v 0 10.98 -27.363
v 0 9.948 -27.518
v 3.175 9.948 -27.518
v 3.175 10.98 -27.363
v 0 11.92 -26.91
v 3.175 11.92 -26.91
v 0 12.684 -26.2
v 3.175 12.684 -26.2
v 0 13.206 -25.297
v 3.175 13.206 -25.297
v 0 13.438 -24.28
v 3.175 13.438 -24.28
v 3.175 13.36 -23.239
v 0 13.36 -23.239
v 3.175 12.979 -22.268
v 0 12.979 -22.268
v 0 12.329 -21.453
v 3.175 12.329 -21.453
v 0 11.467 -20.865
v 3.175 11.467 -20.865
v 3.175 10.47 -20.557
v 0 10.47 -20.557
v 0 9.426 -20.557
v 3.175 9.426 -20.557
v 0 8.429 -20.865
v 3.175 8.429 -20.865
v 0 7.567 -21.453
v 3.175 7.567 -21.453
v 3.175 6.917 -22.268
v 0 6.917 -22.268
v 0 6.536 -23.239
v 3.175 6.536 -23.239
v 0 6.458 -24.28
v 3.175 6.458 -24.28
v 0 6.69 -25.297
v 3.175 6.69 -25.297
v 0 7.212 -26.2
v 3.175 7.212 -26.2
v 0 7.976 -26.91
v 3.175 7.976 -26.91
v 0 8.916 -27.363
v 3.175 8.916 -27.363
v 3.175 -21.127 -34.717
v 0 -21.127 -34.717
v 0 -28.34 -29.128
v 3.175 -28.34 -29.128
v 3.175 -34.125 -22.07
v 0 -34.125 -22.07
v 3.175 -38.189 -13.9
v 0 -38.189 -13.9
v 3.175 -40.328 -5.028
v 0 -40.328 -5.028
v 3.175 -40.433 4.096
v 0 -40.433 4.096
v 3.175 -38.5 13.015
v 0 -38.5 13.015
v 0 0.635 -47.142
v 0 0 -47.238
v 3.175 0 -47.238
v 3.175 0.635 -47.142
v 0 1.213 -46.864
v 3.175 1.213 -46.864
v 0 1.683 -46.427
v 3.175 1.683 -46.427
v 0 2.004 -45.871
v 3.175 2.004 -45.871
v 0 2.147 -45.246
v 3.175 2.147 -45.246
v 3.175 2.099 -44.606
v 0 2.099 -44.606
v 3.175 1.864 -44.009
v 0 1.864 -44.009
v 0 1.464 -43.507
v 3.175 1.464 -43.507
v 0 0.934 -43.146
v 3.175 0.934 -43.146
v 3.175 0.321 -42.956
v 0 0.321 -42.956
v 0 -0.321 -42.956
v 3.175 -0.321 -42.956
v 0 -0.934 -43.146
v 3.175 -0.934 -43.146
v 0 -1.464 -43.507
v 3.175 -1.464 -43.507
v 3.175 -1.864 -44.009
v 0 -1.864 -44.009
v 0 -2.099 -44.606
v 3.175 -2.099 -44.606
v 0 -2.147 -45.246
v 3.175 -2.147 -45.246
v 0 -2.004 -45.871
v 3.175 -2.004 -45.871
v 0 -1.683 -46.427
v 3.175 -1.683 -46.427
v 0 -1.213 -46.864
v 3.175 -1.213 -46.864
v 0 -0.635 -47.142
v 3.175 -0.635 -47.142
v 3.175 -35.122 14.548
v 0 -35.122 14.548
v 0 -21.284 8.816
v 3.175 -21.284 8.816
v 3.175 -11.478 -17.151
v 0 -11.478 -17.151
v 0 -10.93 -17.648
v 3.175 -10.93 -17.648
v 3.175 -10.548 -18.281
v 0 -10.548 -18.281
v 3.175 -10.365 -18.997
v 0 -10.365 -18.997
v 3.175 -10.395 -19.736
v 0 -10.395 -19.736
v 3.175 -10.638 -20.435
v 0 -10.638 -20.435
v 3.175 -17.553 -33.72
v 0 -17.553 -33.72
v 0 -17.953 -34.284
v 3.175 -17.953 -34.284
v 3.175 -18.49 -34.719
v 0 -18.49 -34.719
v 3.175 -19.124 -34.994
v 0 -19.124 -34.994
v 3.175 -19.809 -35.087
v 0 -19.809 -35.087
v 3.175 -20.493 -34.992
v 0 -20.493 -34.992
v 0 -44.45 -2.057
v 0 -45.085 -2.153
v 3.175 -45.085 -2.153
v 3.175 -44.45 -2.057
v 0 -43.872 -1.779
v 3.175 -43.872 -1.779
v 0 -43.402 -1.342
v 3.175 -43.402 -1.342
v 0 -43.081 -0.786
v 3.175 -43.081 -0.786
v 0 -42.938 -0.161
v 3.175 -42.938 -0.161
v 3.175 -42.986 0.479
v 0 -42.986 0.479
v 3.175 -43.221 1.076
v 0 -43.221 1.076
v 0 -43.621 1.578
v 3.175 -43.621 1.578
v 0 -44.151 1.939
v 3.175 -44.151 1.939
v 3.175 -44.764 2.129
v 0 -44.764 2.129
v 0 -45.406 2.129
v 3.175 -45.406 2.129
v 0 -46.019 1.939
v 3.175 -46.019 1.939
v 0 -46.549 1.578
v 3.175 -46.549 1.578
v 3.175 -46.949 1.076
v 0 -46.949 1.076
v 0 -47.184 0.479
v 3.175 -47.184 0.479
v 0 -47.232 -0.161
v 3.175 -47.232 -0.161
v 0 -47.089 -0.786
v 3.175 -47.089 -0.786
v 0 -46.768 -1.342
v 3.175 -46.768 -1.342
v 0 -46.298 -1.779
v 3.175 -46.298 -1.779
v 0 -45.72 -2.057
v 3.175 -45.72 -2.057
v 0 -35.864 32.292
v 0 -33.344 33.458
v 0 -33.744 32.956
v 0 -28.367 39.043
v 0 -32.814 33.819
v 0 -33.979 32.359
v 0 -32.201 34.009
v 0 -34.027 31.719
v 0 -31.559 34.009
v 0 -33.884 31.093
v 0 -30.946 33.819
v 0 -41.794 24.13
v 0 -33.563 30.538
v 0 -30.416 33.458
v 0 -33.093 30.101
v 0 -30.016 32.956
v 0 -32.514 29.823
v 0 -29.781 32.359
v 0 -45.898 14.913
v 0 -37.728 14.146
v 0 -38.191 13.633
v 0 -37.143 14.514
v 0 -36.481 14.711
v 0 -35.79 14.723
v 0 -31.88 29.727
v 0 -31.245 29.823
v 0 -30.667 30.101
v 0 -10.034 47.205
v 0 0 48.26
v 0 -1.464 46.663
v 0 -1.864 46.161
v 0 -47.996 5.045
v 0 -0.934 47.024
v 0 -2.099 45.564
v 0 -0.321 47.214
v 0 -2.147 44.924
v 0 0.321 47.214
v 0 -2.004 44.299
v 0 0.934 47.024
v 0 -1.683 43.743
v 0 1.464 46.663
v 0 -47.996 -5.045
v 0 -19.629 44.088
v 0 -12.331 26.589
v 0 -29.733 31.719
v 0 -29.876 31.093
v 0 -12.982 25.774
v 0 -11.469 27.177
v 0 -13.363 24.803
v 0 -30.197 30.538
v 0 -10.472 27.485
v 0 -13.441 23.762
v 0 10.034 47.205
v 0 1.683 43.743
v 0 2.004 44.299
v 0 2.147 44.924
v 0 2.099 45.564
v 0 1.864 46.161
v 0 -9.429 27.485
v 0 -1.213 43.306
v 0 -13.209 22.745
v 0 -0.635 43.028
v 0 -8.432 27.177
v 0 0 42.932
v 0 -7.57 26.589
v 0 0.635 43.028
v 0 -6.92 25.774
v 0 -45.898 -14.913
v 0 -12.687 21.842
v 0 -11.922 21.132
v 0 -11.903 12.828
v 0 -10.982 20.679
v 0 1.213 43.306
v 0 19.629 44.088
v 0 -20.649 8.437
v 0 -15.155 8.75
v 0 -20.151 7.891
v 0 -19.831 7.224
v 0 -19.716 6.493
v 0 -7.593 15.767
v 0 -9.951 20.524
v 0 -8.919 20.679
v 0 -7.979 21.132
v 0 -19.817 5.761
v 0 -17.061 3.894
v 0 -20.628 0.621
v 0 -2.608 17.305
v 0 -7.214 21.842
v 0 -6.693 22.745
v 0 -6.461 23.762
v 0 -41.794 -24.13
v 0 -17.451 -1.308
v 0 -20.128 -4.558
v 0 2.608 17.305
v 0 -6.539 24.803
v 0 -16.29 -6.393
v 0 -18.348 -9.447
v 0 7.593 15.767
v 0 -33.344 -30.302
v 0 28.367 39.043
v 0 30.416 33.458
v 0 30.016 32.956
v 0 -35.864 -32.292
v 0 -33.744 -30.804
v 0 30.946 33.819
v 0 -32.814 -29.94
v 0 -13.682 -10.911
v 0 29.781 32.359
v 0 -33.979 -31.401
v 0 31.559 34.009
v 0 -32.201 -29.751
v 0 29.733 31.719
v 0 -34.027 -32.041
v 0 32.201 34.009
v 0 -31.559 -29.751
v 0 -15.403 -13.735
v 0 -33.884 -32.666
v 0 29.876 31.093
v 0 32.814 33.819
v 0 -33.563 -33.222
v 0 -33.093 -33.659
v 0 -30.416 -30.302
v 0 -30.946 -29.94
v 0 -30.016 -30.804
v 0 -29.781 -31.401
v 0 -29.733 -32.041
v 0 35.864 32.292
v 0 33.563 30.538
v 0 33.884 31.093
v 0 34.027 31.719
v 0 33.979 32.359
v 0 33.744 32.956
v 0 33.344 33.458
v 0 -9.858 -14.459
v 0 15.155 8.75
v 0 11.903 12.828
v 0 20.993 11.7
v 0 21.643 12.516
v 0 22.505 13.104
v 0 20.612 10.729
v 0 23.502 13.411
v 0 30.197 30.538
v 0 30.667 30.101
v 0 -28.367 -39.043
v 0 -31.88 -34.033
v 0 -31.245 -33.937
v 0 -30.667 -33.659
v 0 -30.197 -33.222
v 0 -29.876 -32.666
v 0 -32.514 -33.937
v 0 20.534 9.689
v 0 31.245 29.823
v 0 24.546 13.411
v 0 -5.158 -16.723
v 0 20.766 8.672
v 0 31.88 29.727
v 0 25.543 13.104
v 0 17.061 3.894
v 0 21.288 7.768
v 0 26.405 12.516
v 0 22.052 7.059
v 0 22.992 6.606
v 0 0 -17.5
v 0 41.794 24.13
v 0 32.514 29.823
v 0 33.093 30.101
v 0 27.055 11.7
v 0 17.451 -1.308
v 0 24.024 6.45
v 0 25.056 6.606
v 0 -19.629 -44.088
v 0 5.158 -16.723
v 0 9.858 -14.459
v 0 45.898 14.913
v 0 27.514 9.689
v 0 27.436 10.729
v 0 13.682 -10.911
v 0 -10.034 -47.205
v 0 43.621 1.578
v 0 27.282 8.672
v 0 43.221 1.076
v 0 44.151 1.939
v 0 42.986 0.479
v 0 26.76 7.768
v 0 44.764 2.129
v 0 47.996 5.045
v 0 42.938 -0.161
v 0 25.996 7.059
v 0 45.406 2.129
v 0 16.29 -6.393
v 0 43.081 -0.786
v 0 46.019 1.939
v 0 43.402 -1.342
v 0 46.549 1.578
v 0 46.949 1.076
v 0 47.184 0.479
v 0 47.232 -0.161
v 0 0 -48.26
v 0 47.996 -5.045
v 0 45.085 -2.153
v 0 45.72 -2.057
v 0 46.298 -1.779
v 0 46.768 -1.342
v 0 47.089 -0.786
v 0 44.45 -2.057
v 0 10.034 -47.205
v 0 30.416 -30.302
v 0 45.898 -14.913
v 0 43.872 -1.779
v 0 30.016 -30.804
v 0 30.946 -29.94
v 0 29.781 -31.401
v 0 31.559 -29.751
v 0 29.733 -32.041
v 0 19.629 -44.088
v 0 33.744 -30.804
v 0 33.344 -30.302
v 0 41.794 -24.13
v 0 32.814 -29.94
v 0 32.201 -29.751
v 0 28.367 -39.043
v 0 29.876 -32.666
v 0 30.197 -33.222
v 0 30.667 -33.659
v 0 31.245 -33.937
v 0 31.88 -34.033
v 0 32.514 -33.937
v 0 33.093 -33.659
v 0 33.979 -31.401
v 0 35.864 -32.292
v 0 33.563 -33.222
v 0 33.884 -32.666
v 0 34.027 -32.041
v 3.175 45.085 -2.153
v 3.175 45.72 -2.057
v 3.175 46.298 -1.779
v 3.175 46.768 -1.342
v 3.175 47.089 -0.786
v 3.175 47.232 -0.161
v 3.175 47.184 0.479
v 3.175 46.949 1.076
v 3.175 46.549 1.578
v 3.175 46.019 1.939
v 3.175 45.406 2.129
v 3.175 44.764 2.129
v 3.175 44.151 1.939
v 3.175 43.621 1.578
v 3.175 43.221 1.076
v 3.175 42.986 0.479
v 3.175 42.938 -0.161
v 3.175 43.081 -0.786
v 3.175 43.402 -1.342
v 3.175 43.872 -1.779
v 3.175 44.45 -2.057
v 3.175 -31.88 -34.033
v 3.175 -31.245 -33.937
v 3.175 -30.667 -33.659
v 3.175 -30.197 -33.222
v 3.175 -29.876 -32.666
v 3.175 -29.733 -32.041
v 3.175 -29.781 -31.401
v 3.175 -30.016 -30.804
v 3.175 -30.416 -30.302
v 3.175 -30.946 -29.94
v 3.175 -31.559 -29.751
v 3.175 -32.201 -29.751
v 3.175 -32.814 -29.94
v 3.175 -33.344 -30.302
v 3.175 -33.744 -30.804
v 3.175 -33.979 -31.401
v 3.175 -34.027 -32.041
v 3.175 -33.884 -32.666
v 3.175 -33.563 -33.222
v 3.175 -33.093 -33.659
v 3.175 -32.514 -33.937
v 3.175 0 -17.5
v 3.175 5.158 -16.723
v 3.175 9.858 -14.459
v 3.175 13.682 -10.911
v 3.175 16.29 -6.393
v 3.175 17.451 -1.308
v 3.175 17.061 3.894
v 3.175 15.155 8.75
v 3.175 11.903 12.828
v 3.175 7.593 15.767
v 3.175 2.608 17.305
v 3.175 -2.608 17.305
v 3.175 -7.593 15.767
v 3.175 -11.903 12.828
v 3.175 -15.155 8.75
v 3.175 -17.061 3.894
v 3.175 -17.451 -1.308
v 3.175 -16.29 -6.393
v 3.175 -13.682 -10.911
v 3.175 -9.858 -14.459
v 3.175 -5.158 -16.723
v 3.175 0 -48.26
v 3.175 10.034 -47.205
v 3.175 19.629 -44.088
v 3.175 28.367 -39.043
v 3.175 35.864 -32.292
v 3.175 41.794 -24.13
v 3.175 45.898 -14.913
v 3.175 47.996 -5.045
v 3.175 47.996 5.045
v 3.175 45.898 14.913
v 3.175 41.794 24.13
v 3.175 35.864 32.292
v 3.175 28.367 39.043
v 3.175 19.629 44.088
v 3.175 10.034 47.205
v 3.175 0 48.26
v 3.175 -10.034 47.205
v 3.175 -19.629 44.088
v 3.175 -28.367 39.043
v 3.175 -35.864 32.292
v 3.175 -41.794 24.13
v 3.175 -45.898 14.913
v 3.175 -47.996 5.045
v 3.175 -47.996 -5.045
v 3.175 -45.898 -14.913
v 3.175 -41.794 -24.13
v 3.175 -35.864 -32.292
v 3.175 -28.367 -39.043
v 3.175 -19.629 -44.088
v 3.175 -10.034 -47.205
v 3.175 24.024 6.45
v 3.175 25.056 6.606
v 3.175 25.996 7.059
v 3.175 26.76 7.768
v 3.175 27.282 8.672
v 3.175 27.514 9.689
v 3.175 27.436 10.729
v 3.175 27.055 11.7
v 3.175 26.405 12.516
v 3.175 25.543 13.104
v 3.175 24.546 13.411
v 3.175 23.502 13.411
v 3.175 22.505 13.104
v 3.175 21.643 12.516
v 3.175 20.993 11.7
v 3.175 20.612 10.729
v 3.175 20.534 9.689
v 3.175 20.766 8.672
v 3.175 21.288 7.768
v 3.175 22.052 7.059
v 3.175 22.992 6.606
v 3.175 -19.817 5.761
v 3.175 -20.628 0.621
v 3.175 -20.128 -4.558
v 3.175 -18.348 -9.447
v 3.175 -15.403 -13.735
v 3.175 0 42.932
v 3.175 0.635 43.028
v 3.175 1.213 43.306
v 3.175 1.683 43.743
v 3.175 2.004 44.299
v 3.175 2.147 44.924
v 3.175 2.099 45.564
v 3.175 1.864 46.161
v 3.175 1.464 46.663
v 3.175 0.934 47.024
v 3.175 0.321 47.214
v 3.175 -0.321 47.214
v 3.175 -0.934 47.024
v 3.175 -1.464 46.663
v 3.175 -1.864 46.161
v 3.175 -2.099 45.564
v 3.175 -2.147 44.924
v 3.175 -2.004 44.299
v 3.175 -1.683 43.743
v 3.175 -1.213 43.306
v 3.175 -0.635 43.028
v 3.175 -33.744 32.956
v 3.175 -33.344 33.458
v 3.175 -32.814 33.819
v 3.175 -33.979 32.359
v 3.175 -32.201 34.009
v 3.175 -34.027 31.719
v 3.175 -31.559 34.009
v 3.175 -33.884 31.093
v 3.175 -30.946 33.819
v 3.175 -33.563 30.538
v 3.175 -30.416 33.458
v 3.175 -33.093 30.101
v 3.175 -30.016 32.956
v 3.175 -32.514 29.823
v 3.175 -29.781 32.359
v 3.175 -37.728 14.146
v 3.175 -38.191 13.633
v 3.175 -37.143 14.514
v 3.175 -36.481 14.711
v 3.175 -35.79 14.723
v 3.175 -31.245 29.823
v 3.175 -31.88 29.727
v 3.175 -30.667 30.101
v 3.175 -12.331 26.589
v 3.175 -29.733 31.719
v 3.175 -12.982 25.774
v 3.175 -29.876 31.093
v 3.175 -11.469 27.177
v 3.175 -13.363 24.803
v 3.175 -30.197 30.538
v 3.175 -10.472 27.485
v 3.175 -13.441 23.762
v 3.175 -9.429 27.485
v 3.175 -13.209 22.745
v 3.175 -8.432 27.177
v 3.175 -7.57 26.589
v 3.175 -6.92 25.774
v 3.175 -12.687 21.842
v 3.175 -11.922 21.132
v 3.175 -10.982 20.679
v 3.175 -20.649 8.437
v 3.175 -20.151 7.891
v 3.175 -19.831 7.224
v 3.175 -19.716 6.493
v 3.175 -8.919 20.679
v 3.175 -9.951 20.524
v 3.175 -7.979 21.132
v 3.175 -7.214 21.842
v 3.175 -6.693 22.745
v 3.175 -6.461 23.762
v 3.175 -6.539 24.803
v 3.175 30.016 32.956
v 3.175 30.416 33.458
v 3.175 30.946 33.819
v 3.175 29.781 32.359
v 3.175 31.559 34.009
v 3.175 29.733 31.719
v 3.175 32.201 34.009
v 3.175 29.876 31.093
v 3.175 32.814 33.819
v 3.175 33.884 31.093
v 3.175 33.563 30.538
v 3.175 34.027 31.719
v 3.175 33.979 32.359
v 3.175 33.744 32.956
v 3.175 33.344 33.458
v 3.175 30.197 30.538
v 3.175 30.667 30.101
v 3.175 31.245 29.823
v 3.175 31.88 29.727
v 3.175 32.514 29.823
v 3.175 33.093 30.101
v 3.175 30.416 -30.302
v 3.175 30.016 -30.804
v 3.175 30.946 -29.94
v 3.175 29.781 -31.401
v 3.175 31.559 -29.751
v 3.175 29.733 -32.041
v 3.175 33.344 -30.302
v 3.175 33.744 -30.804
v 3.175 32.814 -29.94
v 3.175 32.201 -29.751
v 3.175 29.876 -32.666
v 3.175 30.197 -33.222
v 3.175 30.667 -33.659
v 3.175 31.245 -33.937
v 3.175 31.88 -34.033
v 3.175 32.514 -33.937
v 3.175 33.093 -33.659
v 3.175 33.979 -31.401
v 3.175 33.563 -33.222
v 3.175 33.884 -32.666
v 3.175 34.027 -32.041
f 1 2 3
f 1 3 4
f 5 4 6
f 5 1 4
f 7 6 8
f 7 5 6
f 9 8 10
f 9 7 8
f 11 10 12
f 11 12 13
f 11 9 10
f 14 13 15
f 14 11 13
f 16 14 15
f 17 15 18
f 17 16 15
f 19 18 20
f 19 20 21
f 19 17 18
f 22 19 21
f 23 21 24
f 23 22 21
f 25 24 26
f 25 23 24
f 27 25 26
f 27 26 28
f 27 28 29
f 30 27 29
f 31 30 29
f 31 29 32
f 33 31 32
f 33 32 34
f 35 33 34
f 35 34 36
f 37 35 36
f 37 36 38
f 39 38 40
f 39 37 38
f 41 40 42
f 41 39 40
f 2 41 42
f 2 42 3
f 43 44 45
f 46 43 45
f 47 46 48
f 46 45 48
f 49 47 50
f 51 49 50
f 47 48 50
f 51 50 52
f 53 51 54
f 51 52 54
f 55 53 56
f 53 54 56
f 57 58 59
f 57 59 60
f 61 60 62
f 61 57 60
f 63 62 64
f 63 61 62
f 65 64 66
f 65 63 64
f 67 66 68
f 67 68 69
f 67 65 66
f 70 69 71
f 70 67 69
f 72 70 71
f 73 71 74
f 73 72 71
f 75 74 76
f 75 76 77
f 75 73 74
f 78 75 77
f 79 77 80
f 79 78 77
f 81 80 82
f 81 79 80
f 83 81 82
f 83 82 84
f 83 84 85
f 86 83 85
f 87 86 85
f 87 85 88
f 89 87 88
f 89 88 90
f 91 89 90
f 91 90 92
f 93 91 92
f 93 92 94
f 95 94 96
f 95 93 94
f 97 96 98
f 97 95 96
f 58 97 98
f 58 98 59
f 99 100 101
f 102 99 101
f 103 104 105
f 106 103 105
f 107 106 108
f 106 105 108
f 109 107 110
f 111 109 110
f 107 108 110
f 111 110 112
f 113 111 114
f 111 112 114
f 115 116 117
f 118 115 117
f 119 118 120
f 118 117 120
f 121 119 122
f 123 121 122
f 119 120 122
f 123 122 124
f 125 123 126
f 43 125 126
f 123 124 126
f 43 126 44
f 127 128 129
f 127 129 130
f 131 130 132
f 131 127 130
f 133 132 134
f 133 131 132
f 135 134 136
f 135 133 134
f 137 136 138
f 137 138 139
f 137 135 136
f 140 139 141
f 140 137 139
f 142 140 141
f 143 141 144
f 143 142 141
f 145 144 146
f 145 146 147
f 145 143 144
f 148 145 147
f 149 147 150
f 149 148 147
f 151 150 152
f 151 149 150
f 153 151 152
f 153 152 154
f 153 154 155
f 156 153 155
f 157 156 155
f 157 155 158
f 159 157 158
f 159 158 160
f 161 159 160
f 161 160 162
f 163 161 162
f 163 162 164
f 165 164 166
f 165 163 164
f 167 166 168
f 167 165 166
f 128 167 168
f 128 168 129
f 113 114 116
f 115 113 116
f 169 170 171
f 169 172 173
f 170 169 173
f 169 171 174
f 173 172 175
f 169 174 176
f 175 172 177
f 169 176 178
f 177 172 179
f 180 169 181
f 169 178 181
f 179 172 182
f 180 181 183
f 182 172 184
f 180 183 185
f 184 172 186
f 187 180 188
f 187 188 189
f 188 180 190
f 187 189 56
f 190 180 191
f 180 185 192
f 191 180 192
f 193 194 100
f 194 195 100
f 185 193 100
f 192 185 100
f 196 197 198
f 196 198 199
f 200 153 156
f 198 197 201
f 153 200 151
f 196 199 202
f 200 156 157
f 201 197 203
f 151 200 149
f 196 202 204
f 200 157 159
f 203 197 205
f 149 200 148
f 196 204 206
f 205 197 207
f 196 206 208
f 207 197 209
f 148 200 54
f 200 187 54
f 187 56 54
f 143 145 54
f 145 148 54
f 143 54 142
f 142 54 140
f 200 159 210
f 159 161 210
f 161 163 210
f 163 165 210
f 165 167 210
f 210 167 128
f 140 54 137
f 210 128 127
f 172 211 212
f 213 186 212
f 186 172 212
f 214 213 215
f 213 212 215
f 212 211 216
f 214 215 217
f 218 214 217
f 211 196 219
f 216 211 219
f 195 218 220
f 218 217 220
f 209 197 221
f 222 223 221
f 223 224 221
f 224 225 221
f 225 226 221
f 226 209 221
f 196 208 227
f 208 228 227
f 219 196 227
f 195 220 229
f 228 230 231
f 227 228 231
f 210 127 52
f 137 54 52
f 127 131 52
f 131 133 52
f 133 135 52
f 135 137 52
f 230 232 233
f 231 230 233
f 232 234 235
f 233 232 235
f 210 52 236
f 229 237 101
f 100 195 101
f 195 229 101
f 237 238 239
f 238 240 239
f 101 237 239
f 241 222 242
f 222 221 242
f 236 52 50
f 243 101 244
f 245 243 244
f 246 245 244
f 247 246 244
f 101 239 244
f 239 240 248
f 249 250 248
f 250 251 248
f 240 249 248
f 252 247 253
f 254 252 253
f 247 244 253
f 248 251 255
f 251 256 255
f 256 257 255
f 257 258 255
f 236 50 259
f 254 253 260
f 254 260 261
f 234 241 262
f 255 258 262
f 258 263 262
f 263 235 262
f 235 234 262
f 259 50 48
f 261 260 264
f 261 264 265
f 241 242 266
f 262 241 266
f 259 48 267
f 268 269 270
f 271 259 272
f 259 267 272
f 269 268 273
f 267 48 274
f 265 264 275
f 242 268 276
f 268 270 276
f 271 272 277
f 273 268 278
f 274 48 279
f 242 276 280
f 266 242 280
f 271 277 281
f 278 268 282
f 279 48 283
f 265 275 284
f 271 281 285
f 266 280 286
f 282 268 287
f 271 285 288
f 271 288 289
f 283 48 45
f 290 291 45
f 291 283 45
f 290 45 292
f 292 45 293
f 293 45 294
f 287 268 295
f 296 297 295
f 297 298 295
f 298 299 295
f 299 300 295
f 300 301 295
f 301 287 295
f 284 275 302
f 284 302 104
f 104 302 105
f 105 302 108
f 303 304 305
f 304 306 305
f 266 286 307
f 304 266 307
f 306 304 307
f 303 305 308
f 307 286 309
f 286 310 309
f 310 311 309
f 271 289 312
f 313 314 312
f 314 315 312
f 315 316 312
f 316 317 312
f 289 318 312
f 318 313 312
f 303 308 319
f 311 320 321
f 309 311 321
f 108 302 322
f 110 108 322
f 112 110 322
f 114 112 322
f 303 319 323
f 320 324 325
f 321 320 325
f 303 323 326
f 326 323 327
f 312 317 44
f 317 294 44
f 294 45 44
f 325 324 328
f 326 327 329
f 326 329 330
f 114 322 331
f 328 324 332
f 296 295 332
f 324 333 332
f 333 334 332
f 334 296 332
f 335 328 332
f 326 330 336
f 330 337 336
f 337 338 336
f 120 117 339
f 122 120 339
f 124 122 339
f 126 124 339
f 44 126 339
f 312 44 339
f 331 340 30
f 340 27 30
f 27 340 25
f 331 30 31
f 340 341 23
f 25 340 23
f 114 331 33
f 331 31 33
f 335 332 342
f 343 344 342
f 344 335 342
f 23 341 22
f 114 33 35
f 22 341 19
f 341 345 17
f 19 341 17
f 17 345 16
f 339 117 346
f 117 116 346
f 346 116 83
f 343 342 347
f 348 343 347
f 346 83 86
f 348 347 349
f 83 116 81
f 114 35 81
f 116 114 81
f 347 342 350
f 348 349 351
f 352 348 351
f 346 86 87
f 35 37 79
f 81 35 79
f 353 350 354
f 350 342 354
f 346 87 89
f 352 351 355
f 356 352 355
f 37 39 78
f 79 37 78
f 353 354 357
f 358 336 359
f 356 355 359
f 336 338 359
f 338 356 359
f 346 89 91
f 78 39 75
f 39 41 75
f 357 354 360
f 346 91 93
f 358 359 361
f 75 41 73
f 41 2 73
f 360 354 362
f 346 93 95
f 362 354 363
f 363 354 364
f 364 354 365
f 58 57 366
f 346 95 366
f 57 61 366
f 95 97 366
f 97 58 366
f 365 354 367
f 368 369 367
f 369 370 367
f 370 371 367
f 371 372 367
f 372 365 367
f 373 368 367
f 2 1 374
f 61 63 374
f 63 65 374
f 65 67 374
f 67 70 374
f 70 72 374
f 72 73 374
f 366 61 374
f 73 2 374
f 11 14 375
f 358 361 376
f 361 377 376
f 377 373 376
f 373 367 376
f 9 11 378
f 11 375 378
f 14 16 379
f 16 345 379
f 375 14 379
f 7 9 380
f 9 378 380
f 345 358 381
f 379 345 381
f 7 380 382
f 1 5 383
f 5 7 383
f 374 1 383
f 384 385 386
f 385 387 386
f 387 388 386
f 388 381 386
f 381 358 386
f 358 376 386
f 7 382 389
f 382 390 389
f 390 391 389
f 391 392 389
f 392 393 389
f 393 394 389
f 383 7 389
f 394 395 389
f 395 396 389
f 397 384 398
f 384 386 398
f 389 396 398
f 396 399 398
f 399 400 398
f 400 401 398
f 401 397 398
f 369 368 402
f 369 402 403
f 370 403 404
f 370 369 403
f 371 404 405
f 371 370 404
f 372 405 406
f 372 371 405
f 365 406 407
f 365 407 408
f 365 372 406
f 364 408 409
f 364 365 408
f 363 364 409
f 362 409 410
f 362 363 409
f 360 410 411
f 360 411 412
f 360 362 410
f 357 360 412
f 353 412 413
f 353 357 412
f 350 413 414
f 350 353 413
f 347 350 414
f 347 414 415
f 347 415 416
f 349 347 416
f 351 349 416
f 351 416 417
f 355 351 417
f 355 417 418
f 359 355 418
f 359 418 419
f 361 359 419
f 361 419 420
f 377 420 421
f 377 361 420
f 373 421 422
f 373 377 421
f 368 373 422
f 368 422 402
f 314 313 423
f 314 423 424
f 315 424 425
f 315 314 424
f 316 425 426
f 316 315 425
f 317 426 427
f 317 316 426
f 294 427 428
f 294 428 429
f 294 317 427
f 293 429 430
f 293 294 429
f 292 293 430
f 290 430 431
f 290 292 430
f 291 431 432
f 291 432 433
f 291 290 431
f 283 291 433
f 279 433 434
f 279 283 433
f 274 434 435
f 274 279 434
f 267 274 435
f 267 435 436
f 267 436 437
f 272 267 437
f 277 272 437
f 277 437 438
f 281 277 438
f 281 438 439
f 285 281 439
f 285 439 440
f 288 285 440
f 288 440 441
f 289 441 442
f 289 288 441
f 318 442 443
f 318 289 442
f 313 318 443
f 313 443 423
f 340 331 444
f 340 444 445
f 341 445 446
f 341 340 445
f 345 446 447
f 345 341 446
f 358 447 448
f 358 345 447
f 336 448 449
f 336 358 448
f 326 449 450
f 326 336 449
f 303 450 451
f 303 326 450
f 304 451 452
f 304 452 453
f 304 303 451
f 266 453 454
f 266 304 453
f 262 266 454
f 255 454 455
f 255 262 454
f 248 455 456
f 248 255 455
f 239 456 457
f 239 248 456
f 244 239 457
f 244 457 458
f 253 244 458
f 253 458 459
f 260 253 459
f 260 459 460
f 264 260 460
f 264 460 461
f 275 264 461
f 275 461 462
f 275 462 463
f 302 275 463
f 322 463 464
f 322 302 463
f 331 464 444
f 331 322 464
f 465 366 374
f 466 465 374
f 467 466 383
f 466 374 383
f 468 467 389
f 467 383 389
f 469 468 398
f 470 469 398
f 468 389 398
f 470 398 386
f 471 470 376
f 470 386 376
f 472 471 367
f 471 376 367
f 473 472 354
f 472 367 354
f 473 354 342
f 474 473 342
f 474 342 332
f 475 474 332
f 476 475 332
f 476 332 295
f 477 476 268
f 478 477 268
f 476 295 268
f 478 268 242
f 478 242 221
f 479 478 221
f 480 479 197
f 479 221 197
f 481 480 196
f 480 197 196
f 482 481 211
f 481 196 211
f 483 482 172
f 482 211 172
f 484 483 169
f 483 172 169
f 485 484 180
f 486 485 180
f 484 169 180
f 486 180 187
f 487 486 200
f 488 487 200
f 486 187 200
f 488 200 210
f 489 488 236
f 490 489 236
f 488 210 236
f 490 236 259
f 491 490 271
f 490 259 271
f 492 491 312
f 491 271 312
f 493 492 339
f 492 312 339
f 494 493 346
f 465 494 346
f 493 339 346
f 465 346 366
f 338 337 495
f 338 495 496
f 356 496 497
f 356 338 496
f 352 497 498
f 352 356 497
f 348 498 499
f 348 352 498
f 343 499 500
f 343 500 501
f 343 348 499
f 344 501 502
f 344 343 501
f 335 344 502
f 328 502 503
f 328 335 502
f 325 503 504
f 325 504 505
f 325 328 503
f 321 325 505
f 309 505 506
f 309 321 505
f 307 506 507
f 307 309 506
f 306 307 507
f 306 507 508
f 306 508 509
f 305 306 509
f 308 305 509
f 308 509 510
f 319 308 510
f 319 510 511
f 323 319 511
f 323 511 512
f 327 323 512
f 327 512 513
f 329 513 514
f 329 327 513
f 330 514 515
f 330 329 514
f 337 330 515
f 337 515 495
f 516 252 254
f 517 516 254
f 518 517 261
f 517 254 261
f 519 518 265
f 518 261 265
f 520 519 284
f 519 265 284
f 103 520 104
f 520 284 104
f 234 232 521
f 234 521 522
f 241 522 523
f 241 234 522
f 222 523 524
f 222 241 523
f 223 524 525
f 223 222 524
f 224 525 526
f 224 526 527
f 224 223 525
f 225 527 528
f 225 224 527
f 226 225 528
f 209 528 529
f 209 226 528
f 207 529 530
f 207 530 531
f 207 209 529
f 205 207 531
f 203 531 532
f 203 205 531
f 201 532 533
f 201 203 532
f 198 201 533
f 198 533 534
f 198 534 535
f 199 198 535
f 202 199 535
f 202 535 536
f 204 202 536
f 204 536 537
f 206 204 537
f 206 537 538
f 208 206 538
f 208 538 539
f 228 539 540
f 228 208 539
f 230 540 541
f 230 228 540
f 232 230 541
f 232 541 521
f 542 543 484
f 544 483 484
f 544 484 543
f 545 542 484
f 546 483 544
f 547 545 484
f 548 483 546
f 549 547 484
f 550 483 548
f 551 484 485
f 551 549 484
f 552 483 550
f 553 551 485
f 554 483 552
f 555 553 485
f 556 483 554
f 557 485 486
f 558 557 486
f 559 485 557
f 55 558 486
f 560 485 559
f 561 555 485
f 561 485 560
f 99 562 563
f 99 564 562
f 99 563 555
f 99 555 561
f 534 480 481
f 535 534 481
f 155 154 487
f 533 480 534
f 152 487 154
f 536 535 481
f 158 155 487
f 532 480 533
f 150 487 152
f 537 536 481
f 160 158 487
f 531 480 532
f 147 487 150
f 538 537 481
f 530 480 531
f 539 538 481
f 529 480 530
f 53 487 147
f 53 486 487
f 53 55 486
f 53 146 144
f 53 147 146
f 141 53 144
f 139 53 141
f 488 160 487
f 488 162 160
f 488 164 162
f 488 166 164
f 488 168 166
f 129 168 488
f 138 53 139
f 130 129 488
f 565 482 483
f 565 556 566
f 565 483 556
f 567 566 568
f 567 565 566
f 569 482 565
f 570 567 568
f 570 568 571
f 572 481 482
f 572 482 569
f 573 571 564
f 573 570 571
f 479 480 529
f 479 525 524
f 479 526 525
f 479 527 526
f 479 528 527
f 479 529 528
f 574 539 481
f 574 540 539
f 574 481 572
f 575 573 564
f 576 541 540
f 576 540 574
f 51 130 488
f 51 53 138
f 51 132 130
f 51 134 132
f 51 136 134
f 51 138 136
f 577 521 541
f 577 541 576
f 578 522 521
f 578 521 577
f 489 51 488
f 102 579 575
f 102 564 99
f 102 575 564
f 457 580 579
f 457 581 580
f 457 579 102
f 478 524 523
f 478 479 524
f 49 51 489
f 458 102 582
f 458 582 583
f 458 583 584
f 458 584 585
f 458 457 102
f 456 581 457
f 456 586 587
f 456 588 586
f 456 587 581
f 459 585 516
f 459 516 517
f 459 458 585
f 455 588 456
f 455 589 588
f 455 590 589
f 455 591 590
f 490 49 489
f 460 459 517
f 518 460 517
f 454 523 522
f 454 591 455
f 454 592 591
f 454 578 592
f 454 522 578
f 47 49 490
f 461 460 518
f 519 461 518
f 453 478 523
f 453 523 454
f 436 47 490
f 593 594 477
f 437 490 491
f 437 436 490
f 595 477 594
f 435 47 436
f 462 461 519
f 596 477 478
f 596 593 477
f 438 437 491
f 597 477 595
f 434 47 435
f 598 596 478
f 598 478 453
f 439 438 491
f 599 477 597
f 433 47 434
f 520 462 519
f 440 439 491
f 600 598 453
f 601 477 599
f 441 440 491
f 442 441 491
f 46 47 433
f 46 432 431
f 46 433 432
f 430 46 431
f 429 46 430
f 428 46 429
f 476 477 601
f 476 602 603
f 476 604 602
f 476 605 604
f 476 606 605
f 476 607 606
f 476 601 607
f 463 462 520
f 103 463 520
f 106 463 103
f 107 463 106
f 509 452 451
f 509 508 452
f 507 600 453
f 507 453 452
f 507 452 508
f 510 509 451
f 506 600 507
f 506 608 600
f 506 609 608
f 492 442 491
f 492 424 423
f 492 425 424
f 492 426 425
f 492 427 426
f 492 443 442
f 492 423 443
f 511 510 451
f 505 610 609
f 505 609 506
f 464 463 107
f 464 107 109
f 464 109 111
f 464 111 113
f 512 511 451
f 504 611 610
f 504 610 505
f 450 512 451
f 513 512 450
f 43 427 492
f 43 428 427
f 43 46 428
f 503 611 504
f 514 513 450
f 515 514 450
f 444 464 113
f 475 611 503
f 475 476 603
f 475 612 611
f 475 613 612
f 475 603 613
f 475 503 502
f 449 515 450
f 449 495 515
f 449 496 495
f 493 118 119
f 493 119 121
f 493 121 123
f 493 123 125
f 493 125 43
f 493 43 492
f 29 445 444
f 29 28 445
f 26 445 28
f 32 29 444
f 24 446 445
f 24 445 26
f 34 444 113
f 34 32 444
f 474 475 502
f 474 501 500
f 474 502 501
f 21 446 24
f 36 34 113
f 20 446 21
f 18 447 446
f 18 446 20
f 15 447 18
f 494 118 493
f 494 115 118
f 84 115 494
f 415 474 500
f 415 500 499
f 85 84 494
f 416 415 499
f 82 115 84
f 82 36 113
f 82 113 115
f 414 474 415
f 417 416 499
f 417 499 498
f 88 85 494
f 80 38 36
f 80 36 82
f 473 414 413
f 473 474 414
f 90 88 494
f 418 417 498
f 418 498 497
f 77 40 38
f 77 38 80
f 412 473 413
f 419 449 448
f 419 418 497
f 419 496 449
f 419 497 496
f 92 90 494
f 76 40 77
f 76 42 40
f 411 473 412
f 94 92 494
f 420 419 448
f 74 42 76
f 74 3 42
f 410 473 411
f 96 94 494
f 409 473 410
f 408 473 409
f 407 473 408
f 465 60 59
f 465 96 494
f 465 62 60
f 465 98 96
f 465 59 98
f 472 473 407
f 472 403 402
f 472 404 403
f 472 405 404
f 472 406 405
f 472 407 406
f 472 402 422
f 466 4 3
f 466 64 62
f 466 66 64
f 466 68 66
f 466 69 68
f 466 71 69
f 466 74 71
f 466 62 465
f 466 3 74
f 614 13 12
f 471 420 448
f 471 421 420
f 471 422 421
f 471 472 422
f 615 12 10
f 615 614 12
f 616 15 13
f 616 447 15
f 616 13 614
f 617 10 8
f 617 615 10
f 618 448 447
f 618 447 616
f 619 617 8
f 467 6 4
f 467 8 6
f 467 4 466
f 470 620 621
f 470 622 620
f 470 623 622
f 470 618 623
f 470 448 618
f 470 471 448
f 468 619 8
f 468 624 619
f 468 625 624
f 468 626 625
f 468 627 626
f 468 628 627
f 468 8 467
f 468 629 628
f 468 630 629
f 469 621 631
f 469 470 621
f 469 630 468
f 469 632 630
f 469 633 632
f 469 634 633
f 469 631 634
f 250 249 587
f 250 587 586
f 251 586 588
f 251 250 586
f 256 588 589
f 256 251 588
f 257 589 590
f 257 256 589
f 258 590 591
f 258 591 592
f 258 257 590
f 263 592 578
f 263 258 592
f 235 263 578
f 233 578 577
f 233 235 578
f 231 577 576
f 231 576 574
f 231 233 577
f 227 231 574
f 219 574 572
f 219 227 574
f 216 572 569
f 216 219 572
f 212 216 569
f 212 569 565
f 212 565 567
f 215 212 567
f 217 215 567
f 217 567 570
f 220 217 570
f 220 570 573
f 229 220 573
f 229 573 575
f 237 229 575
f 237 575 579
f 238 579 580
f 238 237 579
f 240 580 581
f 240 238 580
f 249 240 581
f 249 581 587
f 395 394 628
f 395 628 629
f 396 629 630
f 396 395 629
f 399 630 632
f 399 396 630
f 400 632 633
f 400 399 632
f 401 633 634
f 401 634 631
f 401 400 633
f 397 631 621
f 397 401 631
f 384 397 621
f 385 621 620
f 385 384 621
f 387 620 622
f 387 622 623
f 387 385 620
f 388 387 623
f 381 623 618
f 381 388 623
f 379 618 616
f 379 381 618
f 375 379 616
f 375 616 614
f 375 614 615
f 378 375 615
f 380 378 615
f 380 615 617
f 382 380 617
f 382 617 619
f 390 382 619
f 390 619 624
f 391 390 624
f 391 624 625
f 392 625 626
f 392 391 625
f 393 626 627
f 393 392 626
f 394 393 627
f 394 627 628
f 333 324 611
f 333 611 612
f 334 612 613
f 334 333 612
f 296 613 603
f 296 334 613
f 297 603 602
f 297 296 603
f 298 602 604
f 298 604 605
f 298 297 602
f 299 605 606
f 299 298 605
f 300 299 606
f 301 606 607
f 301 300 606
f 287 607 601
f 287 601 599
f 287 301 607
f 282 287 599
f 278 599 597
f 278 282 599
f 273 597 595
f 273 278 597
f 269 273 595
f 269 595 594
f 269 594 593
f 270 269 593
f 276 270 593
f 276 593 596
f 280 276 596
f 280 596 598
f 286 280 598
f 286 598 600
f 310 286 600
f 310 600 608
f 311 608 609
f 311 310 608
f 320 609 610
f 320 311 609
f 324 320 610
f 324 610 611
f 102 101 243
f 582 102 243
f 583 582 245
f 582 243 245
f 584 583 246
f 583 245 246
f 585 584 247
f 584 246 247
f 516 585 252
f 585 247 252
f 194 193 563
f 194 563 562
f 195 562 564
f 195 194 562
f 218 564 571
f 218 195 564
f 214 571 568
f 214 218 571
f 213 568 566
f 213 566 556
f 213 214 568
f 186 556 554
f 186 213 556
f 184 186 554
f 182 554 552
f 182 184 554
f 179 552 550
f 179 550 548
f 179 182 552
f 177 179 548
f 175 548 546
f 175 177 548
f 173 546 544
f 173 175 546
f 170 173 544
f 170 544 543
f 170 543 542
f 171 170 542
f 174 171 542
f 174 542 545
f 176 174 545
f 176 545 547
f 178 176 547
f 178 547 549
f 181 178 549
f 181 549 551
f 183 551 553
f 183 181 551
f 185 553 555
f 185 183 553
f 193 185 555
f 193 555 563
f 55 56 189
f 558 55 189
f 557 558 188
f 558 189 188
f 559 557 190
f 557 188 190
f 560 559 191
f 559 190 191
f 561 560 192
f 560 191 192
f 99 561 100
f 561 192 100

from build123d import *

# Parameters (mm, degrees)
SKETCH5_R           = 48.26
SKETCH5_R_2         = 2.15265
SKETCH5_R_3         = 3.5
SKETCH5_R_4         = 17.5
BOSS_EXTRUDE3_DEPTH = 3.175


with BuildPart() as part:
    # Sketch5 → Boss-Extrude3 (new body)
    with BuildSketch(Plane(origin=(0, 0, 0), x_dir=(0, 0, -1), z_dir=(1, 0, 0))):
        Circle(SKETCH5_R)
        with Locations((0, 45.085)):
            Circle(SKETCH5_R_2, mode=Mode.SUBTRACT)
        with Locations((-24.023795501, -9.950801949)):
            Circle(SKETCH5_R_3, mode=Mode.SUBTRACT)
        with Locations((31.87990923, 31.87990923)):
            Circle(SKETCH5_R_2, mode=Mode.SUBTRACT)
        with Locations((45.085, 0)):
            Circle(SKETCH5_R_2, mode=Mode.SUBTRACT)
        with Locations((24.018239985, 9.948012748)):
            Circle(SKETCH5_R_3, mode=Mode.SUBTRACT)
        with Locations((-9.9503853, 24.023968076)):
            Circle(SKETCH5_R_3, mode=Mode.SUBTRACT)
        with Locations((31.87990923, -31.87990923)):
            Circle(SKETCH5_R_2, mode=Mode.SUBTRACT)
        with Locations((0, -45.085)):
            Circle(SKETCH5_R_2, mode=Mode.SUBTRACT)
        with Locations((-31.87990923, -31.87990923)):
            Circle(SKETCH5_R_2, mode=Mode.SUBTRACT)
        with Locations((-45.085, 0)):
            Circle(SKETCH5_R_2, mode=Mode.SUBTRACT)
        with Locations((-31.87990923, 31.87990923)):
            Circle(SKETCH5_R_2, mode=Mode.SUBTRACT)
        Circle(SKETCH5_R_4, mode=Mode.SUBTRACT)
        with BuildLine():
            Line((20.434868218, -10.637719077), (33.719928863, -17.553483913))
            ThreePointArc((33.719928863, -17.553483913), (34.993654696, -19.123916601), (34.716893211, -21.126924191))
            ThreePointArc((34.716893211, -21.126924191), (13.899698625, -38.189108109), (-13.014558026, -38.49975168))
            ThreePointArc((-13.014558026, -38.49975168), (-14.514078084, -37.143257699), (-14.547802162, -35.121501281))
            Line((-14.547802162, -35.121501281), (-8.816223227, -21.284245682))
            ThreePointArc((-8.816223227, -21.284245682), (-7.568898247, -19.966485263), (-5.760575328, -19.817219233))
            ThreePointArc((-5.760575328, -19.817219233), (7.058440708, -19.392906461), (17.1511197, -11.478044227))
            ThreePointArc((17.1511197, -11.478044227), (18.632321778, -10.430021072), (20.434868218, -10.637719077))
        make_face(mode=Mode.SUBTRACT)
    extrude(amount=BOSS_EXTRUDE3_DEPTH)


solid = part.part
